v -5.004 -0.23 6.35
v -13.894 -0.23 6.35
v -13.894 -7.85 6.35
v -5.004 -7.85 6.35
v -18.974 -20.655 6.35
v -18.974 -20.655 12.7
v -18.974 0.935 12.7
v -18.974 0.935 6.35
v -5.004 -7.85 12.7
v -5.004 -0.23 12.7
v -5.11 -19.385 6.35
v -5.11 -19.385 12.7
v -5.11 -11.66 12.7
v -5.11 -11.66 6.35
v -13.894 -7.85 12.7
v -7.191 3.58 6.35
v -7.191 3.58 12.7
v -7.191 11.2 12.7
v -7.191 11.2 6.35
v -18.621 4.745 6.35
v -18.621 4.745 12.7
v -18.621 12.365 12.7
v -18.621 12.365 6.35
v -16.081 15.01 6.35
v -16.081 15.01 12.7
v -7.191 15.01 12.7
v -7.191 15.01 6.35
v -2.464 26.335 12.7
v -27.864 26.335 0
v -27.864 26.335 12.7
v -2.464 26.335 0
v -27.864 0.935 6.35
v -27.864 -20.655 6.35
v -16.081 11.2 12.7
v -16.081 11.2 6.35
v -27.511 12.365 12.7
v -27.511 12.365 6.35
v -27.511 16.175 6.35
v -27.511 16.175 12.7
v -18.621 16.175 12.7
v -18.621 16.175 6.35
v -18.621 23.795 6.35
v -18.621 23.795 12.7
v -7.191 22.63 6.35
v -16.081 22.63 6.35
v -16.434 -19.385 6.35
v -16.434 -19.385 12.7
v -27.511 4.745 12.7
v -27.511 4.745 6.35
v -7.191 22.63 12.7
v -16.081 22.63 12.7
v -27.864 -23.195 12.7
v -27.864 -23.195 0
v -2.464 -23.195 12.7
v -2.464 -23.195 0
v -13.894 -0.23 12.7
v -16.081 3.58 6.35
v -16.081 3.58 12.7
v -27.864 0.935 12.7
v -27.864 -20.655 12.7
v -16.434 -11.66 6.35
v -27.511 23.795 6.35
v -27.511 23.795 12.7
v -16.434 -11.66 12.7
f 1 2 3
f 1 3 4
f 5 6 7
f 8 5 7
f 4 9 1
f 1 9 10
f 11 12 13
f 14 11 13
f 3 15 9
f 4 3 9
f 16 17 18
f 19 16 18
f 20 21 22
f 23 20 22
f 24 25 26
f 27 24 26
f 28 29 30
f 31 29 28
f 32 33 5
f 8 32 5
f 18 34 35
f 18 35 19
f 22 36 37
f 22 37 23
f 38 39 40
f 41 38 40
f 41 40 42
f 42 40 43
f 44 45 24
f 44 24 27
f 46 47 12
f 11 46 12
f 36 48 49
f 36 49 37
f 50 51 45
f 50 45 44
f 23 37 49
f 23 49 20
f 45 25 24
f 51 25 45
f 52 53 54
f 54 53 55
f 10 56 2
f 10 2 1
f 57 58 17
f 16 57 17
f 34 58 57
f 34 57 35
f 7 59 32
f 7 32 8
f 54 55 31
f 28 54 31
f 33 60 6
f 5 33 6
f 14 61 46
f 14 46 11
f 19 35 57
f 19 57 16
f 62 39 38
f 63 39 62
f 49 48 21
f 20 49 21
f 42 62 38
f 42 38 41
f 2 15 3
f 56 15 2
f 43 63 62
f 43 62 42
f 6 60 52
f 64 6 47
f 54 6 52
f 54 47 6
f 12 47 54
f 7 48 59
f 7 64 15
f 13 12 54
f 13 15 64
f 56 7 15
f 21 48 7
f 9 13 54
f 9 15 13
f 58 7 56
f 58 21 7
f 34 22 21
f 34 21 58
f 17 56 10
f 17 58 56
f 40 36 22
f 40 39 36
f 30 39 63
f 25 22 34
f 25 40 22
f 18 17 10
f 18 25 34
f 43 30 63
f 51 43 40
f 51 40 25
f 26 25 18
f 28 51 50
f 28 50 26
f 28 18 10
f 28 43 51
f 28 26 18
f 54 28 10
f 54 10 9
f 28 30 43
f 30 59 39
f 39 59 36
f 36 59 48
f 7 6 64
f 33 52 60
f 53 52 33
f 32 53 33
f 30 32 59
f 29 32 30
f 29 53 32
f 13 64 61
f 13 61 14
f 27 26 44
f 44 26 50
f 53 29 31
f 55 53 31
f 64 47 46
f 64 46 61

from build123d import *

# Parameters (mm, degrees)
SKETCH1_W           = 25.4
SKETCH1_H           = 49.53
BOSS_EXTRUDE2_DEPTH = 12.7
SKETCH2_W           = 8.89
SKETCH2_H           = 21.59
SKETCH2_W_2         = 11.324200872
SKETCH2_H_2         = 7.724794812
SKETCH2_H_3         = 7.62
CUT_EXTRUDE1_DEPTH  = 6.35


with BuildPart() as part:
    # Sketch1 → Boss-Extrude2 (new body)
    with BuildSketch(Plane.XY):
        with Locations((-15.1641049, 1.570131369)):
            Rectangle(SKETCH1_W, SKETCH1_H)
    extrude(amount=BOSS_EXTRUDE2_DEPTH)

    # Sketch2 → Cut-Extrude1 (cut)
    with BuildSketch(Plane.XY.offset(12.7)):
        with Locations((-23.4191049, -9.859868631)):
            Rectangle(SKETCH2_W, SKETCH2_H)
        with Locations((-10.772004464, -15.522471225)):
            Rectangle(SKETCH2_W_2, SKETCH2_H_2)
        with Locations((-9.4491049, -4.040073819)):
            Rectangle(SKETCH2_W, SKETCH2_H_3)
        with Locations((-23.066267196, 8.555131369)):
            Rectangle(SKETCH2_W, SKETCH2_H_3)
        with Locations((-11.636267196, 7.389926181)):
            Rectangle(SKETCH2_W, SKETCH2_H_3)
        with Locations((-23.066267196, 19.985131369)):
            Rectangle(SKETCH2_W, SKETCH2_H_3)
        with Locations((-11.636267196, 18.819926181)):
            Rectangle(SKETCH2_W, SKETCH2_H_3)
    extrude(amount=-CUT_EXTRUDE1_DEPTH, mode=Mode.SUBTRACT)


solid = part.part
